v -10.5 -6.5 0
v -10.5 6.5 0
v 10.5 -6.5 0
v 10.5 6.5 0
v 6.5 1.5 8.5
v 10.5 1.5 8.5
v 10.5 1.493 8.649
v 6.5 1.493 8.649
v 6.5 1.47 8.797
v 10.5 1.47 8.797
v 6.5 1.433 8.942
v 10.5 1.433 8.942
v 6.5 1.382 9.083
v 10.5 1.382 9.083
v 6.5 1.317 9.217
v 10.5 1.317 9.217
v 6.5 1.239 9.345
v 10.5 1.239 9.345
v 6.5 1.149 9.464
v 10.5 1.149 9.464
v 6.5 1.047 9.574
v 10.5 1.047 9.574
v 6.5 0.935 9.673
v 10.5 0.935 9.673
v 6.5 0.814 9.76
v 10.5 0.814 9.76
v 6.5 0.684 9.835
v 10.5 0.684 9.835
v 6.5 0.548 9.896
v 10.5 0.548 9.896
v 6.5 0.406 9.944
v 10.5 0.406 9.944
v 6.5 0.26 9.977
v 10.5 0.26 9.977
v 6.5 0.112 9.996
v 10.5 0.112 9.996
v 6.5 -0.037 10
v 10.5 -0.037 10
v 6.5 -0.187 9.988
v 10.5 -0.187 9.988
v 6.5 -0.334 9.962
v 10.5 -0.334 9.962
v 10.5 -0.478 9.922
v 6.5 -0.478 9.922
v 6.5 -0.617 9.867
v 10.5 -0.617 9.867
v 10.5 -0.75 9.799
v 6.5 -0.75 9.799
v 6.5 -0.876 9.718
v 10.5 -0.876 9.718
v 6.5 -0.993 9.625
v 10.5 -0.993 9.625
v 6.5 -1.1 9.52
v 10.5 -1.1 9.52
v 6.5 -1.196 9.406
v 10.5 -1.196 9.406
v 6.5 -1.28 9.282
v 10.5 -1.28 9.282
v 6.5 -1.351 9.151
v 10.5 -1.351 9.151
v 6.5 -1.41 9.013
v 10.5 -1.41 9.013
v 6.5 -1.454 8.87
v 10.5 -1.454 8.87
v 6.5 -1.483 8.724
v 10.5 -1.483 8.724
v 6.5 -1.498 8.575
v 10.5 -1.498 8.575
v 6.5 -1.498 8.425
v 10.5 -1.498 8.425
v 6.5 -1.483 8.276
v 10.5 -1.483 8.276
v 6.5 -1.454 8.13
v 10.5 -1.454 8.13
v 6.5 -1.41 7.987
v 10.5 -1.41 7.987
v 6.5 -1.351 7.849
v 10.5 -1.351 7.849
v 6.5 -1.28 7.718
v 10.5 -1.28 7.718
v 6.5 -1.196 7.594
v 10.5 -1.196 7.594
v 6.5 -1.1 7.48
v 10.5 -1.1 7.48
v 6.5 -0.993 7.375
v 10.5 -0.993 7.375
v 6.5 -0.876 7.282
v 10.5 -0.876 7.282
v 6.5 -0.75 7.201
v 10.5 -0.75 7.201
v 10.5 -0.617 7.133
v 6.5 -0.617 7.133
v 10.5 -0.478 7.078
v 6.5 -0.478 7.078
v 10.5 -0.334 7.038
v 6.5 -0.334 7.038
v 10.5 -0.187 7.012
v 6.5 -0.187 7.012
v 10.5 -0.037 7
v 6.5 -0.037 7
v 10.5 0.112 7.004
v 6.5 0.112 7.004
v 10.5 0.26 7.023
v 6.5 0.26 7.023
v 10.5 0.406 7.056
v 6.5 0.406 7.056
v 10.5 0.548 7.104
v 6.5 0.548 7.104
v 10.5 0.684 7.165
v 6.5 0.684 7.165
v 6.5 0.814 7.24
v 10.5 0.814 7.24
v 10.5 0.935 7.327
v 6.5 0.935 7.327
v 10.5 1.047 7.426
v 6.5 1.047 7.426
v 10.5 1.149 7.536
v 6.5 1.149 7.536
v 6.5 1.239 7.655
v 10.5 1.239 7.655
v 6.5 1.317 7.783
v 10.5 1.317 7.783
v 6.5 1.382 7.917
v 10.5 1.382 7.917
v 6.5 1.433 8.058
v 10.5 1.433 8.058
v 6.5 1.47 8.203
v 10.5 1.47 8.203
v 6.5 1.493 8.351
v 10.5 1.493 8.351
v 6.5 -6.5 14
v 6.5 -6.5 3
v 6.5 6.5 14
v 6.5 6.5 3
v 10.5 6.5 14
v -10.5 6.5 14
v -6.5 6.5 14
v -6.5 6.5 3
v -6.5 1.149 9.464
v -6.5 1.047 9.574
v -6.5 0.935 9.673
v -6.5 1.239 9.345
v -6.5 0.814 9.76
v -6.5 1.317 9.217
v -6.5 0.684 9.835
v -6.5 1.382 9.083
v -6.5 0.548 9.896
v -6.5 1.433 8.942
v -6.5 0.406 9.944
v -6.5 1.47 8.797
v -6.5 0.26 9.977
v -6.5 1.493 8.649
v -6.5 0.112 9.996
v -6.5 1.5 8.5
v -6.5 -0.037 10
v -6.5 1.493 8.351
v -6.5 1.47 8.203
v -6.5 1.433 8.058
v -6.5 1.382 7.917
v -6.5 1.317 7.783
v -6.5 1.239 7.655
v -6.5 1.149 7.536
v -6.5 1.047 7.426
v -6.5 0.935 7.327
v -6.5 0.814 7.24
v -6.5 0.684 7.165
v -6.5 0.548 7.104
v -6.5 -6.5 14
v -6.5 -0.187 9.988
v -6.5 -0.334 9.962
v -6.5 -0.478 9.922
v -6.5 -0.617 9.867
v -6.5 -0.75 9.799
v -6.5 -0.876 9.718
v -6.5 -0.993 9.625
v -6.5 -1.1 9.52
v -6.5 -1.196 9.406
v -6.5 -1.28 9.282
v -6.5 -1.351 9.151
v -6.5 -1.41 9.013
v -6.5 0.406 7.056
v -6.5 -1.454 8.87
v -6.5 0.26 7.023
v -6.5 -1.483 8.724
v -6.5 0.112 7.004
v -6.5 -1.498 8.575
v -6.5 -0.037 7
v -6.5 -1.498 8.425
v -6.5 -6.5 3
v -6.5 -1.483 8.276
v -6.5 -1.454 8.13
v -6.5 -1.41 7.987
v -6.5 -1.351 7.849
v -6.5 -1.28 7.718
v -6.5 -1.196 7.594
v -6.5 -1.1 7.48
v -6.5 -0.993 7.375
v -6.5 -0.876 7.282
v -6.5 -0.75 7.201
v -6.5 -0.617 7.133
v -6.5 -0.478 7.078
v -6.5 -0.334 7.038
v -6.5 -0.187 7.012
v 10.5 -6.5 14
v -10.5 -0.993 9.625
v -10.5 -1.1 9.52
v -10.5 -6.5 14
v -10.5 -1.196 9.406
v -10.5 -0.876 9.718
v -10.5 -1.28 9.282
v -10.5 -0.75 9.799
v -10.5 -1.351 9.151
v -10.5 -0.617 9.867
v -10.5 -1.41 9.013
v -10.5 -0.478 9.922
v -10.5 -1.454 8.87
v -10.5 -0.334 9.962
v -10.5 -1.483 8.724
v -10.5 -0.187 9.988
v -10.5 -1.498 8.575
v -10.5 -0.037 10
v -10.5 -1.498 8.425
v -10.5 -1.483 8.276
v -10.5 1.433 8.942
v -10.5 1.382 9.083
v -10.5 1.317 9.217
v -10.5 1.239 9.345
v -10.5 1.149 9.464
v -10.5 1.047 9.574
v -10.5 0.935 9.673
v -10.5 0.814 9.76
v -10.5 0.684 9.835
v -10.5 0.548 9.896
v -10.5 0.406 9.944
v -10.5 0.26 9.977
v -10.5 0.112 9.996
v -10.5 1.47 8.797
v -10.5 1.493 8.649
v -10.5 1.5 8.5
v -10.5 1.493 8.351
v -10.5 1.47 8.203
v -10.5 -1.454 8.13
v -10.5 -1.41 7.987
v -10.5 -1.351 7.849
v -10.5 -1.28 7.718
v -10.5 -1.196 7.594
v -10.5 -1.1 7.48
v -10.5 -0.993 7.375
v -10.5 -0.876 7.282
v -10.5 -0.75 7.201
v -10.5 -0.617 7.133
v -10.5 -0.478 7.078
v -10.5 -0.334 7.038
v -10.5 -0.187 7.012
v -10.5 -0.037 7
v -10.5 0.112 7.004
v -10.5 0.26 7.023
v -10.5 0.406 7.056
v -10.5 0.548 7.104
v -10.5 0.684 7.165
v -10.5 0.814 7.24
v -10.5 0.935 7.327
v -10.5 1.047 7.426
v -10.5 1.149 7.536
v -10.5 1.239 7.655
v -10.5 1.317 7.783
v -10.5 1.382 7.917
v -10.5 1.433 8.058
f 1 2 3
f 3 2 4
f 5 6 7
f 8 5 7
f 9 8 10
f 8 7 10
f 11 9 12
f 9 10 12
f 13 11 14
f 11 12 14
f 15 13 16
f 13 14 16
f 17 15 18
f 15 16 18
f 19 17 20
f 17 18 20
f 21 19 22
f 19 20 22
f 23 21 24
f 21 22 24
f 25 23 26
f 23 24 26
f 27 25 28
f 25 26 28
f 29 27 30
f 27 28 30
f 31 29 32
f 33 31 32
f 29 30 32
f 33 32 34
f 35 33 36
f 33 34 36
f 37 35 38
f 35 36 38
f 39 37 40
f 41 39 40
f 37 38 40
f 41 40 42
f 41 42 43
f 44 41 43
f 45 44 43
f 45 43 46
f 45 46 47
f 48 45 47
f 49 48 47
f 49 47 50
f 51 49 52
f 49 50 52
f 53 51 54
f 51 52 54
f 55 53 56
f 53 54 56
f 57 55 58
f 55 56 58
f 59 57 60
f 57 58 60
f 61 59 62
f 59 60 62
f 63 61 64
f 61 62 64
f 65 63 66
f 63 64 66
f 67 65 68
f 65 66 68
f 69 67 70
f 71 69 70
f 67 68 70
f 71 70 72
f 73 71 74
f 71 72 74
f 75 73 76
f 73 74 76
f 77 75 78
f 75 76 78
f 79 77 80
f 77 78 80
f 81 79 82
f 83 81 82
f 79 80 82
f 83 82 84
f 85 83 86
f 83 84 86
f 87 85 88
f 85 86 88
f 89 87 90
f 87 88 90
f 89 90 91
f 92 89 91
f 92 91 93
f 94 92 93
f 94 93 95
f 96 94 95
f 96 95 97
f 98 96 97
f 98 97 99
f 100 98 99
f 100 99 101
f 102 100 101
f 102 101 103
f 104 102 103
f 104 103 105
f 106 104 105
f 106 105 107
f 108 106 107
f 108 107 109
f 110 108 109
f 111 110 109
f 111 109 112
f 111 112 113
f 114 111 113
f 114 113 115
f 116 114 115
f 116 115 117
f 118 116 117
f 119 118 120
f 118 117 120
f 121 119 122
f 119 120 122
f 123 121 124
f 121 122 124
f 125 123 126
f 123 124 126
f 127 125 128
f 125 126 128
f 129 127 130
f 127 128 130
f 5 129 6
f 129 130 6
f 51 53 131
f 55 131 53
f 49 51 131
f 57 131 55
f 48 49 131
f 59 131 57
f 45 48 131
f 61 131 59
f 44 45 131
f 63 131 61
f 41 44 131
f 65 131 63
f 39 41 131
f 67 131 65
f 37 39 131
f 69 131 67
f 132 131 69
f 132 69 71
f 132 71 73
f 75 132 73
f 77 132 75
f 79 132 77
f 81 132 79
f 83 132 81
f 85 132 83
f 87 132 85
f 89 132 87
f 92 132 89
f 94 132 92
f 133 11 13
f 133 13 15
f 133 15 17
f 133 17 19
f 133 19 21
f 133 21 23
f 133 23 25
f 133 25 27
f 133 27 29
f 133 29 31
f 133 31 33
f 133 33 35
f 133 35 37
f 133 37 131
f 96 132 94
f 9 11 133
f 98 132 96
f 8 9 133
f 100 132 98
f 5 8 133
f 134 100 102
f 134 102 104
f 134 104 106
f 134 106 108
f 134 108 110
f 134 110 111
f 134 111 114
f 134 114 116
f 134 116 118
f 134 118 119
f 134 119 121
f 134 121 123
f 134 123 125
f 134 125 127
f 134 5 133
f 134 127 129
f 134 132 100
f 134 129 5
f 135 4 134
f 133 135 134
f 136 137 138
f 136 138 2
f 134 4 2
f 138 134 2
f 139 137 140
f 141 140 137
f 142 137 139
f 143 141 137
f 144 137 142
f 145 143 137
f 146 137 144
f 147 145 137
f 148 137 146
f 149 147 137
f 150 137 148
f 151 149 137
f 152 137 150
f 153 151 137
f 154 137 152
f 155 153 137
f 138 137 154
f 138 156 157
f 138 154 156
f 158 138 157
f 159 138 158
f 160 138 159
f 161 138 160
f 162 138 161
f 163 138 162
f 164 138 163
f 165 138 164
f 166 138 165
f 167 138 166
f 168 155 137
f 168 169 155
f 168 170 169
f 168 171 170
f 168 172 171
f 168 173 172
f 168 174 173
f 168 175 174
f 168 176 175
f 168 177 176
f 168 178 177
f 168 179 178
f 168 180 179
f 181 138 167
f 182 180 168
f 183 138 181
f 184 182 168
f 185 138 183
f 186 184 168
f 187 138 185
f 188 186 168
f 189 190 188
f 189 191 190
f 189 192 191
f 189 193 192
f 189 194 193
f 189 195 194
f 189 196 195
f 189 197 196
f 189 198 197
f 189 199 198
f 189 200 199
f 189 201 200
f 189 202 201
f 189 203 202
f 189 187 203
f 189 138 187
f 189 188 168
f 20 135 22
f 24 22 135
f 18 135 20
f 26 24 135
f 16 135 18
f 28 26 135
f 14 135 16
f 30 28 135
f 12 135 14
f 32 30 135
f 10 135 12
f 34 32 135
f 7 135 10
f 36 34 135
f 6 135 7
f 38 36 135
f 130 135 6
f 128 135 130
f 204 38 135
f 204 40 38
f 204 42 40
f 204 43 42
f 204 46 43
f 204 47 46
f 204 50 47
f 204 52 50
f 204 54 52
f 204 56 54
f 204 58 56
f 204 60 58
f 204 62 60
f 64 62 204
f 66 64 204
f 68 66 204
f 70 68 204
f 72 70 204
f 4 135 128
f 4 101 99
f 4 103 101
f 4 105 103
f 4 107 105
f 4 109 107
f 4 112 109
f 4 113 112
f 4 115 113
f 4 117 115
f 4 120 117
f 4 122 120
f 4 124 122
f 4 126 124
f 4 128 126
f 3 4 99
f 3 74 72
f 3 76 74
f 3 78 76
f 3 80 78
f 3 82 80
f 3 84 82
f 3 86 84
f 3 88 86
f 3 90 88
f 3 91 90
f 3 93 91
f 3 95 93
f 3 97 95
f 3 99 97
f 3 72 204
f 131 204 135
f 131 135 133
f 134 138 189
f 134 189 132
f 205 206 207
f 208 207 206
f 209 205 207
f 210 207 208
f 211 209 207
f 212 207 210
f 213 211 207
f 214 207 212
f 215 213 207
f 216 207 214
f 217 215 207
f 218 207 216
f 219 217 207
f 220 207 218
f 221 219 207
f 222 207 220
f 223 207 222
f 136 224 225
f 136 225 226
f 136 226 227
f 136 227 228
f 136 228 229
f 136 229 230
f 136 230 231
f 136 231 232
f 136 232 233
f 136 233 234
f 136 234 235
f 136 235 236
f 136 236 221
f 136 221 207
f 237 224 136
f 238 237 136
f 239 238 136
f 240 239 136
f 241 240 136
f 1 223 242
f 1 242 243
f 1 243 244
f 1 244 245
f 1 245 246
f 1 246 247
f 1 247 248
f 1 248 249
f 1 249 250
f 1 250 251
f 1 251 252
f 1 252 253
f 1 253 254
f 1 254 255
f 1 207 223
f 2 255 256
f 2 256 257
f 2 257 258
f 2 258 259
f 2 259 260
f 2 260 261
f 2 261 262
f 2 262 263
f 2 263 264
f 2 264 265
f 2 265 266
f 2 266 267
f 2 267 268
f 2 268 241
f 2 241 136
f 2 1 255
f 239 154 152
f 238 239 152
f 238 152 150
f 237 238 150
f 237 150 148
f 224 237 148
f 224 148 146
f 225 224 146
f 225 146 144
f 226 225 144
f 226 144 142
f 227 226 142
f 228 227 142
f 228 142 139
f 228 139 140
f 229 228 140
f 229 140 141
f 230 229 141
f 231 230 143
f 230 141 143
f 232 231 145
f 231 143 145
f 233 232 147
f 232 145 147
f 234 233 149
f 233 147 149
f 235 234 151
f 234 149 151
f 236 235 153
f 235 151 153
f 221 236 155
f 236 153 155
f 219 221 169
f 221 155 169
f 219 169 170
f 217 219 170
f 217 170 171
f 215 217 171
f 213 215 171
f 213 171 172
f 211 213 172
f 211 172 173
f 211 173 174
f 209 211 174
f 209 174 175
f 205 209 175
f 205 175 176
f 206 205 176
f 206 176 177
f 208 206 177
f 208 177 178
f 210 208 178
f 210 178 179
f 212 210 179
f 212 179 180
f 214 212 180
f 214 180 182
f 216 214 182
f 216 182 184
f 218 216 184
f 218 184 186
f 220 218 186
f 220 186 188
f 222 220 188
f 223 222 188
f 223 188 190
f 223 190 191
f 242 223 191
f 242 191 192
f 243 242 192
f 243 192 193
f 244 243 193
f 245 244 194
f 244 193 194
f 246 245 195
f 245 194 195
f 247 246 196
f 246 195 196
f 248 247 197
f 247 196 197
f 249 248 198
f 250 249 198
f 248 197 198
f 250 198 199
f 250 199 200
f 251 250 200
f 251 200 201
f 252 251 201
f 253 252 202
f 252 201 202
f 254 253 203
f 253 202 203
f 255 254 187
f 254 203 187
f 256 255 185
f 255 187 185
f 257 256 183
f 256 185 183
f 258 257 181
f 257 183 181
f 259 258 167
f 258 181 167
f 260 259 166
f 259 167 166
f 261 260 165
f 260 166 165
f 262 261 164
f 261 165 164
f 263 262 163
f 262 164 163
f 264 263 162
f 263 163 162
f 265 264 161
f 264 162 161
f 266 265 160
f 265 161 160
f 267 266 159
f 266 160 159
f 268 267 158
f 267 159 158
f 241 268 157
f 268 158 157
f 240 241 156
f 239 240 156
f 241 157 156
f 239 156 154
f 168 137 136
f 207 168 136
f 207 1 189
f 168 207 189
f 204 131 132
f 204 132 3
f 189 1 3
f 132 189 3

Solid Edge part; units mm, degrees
sketch "Sketch1" plane through (0, 0, 0) normal (0, 0, 1) x (1, 0, 0)
  line L0 (-6.5, -6.5) -> (6.5, -6.5)
  line L1 (6.5, -6.5) -> (6.5, 6.5)
  line L2 (6.5, 6.5) -> (-6.5, 6.5)
  line L3 (-6.5, 6.5) -> (-6.5, -6.5)
extrude "Protrusion1" add sketch "Sketch1" along normal blind 3
sketch "Sketch2" plane through (0, 0, 0) normal (0, 0, 1) x (1, 0, 0)
  line L0 (10.5, -6.5) -> (6.5, -6.5)
  line L1 (6.5, -6.5) -> (6.5, 6.5)
  line L2 (6.5, 6.5) -> (10.5, 6.5)
  line L3 (10.5, 6.5) -> (10.5, -6.5)
  line L4 (-6.5, -6.5) -> (-10.5, -6.5)
  line L5 (-10.5, -6.5) -> (-10.5, 6.5)
  line L6 (-10.5, 6.5) -> (-6.5, 6.5)
  line L7 (-6.5, 6.5) -> (-6.5, -6.5)
extrude "ExtrudedProtrusion_2" add sketch "Sketch2" along normal blind 14
sketch "Sketch3" plane through (10.5, 0, 7) normal (1, 0, 0) x (0, 1, 0)
  circle A0 centre (0, 1.5) radius 1.5
extrude "ExtrudedCutout_1" cut sketch "Sketch3" against normal blind 39
